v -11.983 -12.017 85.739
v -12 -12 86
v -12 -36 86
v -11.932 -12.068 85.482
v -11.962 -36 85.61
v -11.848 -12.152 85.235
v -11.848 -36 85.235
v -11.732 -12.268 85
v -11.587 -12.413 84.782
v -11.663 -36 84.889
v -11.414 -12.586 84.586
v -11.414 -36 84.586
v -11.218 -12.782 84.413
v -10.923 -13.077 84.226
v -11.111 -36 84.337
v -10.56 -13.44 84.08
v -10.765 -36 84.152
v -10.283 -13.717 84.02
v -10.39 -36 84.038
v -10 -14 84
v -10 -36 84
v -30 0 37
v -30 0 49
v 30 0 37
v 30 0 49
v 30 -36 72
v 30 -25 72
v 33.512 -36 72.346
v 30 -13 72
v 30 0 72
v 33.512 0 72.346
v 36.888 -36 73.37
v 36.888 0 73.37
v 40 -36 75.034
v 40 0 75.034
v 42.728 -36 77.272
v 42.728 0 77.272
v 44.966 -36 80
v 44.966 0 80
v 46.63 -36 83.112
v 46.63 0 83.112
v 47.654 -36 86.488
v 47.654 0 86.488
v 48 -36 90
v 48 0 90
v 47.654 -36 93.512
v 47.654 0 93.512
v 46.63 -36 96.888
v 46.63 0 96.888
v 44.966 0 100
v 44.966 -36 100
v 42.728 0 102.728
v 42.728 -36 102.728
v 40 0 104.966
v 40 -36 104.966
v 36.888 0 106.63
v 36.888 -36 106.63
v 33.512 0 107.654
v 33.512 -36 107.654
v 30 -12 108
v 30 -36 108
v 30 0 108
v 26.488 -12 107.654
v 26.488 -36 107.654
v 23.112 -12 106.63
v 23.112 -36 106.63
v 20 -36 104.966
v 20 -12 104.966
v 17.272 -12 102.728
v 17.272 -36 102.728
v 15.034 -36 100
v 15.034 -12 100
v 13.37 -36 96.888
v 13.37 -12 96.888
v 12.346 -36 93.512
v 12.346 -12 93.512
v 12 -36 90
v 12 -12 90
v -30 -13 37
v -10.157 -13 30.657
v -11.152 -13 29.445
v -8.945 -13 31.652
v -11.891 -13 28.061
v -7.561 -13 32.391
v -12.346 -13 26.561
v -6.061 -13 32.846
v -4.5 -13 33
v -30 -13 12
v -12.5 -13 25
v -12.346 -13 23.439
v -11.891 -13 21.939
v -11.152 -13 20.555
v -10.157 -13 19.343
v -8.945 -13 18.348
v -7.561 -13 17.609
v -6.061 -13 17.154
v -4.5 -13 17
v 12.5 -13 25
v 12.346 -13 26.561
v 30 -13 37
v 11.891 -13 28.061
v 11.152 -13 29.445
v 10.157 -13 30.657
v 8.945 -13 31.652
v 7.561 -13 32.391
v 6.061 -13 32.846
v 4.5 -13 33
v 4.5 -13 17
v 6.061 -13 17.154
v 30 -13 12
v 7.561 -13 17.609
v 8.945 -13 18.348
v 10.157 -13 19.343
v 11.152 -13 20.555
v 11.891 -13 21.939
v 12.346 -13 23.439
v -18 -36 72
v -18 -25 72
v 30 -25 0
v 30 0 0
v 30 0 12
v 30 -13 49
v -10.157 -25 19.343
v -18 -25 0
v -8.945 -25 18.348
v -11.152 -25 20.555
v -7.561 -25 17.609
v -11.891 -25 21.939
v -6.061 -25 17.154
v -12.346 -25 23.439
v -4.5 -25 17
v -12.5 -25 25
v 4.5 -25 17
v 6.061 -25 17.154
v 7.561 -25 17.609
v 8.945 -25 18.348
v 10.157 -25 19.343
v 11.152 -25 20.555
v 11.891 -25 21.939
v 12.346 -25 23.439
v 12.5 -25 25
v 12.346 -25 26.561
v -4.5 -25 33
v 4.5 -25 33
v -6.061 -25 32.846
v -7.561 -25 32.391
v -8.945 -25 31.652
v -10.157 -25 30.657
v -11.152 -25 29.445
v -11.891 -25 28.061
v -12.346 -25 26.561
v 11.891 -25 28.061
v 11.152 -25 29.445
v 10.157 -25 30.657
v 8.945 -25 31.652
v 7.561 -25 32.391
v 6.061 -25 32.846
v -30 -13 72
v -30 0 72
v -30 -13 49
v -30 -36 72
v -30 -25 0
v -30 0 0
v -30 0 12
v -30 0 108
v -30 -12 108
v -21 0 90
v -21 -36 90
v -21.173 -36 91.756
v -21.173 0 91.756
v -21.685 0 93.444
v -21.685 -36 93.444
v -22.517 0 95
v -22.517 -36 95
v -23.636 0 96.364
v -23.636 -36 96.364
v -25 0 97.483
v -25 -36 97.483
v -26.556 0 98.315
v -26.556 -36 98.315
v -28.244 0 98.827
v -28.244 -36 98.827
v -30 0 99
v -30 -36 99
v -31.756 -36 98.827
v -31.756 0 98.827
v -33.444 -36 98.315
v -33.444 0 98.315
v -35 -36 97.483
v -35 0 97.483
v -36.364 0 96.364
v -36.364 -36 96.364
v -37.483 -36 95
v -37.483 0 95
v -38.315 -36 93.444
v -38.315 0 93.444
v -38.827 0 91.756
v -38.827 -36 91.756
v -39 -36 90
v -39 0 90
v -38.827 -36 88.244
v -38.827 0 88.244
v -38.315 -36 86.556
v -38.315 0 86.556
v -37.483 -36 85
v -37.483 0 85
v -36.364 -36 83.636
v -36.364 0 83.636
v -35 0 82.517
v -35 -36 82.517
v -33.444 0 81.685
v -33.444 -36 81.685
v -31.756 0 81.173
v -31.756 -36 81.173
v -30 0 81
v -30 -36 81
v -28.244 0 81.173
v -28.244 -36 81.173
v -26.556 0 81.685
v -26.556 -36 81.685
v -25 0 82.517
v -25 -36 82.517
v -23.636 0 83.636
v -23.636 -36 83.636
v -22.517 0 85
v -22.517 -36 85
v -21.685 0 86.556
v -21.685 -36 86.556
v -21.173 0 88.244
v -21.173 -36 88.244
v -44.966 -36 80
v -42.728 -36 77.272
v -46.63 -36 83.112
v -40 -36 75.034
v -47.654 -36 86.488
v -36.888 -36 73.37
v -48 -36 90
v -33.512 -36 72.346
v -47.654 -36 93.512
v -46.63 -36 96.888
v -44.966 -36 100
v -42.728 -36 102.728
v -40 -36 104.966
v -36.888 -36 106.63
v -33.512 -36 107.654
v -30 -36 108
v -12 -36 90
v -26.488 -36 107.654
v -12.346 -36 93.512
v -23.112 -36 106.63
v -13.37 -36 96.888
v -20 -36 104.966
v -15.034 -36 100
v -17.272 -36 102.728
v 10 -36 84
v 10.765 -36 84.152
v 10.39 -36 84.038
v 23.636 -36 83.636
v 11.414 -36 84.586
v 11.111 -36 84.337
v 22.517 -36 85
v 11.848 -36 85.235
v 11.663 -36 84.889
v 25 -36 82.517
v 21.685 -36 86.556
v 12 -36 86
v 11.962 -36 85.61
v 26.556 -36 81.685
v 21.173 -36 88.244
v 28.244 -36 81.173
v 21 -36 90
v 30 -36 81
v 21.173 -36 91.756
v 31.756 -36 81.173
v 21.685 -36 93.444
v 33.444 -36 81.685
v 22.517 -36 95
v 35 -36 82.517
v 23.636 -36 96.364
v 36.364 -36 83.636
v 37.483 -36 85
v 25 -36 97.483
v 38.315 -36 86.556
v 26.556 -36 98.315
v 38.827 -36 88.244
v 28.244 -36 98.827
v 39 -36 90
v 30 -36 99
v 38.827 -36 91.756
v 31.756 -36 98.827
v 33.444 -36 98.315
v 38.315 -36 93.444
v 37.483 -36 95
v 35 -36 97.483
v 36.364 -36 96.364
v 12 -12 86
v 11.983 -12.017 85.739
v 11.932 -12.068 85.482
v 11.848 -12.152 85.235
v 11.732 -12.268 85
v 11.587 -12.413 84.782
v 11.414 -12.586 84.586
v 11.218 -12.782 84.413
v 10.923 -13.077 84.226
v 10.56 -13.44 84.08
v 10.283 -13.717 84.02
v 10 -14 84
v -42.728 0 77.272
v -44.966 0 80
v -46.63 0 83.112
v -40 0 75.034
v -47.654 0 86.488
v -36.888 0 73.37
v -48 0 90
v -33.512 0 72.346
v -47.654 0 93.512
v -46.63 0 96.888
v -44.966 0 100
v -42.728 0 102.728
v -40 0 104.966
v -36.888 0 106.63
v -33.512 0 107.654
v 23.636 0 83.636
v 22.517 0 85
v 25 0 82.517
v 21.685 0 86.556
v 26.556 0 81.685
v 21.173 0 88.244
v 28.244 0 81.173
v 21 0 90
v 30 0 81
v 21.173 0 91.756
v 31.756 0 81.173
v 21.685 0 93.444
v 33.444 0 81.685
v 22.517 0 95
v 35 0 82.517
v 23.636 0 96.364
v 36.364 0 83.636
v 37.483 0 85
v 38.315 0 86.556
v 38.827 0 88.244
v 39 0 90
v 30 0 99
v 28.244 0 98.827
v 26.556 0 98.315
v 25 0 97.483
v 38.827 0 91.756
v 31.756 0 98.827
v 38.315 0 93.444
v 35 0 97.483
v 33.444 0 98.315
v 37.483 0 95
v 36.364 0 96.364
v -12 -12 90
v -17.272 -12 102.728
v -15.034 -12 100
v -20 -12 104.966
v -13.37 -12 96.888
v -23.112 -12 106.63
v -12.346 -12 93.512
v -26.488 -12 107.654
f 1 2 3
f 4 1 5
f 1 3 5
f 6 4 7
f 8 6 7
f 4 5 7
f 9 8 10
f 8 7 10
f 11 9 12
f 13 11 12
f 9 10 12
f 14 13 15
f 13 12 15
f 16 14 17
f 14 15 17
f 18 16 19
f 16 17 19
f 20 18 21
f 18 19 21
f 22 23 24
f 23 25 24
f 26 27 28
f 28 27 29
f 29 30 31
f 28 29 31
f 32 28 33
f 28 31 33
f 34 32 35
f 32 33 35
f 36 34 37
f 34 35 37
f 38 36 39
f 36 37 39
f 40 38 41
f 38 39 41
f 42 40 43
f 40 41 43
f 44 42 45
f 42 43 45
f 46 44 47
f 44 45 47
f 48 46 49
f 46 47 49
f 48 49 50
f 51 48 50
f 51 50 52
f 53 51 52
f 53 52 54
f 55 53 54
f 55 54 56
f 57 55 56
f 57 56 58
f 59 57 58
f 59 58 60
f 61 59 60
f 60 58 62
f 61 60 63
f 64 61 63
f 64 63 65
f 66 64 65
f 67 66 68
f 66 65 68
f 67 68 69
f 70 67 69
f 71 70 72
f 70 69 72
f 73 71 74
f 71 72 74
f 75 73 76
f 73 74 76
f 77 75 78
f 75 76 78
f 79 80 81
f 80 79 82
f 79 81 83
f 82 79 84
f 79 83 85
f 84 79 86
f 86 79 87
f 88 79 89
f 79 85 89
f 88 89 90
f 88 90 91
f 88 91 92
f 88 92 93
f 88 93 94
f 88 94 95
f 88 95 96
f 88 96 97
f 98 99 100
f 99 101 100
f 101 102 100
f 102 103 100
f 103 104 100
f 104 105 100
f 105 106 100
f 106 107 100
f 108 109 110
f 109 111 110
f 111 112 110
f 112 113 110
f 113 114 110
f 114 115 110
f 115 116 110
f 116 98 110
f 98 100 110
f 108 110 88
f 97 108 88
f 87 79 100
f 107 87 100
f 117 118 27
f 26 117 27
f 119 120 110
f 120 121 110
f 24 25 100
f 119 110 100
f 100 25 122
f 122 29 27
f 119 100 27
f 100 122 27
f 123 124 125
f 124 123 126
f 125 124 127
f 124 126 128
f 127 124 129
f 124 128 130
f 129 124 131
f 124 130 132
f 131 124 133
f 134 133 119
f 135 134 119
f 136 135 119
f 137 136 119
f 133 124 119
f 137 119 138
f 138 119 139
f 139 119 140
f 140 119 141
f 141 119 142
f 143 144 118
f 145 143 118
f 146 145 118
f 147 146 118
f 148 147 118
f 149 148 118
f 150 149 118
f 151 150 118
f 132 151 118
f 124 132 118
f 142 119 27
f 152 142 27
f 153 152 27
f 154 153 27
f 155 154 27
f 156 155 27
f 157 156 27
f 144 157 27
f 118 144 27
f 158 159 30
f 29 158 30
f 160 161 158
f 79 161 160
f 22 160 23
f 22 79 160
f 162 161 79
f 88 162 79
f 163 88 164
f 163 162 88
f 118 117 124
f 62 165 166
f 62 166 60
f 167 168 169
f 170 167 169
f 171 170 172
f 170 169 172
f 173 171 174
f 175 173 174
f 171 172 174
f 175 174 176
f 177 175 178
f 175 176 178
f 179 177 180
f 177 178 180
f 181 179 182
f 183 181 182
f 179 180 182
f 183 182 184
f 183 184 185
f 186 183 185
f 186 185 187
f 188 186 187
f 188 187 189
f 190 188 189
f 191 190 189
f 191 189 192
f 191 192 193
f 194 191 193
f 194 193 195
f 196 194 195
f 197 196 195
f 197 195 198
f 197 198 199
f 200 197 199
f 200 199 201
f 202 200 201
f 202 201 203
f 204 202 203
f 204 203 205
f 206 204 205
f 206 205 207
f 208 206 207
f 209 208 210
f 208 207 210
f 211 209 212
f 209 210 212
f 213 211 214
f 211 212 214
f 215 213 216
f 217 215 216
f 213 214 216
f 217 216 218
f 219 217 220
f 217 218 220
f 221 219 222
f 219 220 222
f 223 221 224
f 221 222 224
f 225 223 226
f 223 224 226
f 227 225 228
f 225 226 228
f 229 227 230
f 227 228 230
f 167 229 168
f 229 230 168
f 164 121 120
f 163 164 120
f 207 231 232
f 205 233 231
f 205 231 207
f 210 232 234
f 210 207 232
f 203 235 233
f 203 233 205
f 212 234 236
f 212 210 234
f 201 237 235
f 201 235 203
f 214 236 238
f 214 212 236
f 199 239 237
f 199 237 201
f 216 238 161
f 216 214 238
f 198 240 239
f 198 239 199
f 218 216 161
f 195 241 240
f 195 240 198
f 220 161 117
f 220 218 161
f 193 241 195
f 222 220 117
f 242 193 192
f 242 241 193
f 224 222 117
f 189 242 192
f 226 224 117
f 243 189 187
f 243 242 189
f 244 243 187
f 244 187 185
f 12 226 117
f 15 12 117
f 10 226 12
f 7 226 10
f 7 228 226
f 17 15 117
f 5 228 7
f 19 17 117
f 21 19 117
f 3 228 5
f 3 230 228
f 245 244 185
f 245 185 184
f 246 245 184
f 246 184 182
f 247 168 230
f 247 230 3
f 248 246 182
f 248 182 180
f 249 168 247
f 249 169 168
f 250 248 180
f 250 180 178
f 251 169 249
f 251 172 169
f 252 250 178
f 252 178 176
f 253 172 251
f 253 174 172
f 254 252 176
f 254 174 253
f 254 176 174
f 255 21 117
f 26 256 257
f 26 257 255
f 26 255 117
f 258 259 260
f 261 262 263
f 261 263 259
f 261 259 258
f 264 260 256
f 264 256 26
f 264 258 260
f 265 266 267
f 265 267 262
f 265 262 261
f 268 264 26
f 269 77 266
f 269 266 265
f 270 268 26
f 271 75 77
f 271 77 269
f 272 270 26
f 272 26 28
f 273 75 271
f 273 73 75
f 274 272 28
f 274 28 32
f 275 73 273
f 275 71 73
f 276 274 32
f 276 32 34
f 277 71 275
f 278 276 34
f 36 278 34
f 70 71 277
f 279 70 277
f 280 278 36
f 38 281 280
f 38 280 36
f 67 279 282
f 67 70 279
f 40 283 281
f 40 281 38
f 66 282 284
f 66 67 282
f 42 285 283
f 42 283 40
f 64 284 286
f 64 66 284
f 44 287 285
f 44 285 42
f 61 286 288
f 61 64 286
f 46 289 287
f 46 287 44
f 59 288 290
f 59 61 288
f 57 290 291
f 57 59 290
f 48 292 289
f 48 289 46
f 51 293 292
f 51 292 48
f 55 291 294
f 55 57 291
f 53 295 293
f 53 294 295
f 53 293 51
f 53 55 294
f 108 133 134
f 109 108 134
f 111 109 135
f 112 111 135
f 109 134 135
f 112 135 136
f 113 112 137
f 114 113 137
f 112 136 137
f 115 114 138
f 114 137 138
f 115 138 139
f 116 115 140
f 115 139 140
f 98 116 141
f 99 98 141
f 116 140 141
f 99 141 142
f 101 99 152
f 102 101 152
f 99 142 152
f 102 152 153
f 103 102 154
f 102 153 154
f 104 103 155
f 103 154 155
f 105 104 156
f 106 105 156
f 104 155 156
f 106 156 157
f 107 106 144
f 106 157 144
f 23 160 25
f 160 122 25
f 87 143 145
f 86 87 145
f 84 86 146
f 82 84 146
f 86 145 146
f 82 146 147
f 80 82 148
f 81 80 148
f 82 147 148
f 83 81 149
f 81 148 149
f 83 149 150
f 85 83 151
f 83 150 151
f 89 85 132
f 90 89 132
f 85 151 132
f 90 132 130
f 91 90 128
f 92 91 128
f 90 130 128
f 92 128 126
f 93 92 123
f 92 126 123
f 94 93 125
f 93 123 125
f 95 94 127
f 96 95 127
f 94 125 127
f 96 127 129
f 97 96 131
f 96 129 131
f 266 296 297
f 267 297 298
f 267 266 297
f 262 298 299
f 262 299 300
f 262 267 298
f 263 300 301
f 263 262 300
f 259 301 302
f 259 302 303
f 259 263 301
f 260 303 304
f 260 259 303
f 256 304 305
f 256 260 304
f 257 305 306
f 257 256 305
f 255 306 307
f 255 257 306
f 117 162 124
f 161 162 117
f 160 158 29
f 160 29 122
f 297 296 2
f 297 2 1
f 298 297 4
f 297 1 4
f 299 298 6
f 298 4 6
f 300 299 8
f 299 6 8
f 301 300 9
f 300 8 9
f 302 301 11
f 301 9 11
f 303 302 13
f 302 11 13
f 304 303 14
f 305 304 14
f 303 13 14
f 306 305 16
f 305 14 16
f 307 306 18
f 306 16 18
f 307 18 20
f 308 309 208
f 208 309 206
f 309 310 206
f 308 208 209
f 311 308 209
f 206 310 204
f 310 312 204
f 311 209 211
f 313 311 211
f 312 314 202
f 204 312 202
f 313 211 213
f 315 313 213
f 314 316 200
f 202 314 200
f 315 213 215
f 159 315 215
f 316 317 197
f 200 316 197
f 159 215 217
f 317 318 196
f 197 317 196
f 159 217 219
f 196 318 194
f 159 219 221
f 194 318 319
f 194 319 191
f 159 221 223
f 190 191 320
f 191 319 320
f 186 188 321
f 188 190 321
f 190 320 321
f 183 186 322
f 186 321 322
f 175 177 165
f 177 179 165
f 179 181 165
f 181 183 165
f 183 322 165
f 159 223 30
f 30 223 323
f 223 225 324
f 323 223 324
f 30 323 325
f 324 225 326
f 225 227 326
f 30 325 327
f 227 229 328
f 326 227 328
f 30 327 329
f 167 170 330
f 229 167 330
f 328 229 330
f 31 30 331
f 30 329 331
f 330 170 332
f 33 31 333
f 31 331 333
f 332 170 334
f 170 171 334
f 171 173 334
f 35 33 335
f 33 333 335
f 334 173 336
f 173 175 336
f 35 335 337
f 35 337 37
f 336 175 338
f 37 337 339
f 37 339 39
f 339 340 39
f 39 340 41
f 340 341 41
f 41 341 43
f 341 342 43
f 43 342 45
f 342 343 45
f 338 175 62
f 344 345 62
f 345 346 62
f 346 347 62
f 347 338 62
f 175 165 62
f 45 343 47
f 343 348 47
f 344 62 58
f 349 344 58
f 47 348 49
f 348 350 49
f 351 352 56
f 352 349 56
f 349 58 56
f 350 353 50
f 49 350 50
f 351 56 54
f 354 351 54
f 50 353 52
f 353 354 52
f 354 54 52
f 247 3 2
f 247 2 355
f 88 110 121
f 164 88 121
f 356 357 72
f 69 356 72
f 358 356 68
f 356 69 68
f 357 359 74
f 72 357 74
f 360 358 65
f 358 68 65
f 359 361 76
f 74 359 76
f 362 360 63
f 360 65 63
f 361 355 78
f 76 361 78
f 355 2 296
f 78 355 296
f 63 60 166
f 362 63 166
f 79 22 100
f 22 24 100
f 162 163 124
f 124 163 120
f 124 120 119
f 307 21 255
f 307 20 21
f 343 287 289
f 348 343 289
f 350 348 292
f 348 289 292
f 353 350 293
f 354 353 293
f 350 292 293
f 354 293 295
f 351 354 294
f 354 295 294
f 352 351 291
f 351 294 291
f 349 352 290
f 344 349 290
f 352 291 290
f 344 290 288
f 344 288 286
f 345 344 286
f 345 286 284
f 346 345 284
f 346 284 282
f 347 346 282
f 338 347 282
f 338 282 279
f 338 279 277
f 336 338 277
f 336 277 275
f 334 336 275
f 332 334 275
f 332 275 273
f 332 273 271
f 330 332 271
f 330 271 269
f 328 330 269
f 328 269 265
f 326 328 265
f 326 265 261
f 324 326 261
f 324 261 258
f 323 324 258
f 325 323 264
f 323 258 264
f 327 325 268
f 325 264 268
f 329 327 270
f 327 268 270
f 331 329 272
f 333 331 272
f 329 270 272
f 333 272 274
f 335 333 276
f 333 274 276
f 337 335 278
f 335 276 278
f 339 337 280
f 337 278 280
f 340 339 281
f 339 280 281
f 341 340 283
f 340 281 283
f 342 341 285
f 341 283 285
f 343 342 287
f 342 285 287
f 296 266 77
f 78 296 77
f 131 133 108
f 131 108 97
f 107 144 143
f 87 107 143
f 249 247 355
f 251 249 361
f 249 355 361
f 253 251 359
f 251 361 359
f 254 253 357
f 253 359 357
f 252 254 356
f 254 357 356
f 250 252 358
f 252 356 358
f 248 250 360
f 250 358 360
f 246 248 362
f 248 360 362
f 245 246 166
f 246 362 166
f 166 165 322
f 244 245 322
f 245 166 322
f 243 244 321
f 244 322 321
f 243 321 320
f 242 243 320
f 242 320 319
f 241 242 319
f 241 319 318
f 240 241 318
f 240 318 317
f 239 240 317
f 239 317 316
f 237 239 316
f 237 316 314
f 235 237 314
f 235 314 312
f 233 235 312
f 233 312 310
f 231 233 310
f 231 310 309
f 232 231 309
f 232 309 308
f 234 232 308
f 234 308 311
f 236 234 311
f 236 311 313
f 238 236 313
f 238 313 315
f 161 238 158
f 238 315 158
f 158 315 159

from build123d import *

# Parameters (mm, degrees)
PAD_DEPTH       = 30
POCKET_DEPTH    = 25.001
PAD003_DEPTH    = 12
PAD001_DEPTH    = 36
PAD002_DEPTH    = 12
SKETCH004_R     = 9
POCKET001_DEPTH = 36.001
FILLET_R        = 2


with BuildPart() as pad003:
    # Sketch → Pad (new body, symmetric)
    with BuildSketch(Plane.YZ):
        Polygon((0, 0), (-25, 0), (-25, 72), (-13, 72), (-13, 49), (0, 49), (0, 37), (-13, 37), (-13, 12), (0, 12), align=None)
    extrude(amount=PAD_DEPTH, both=True)

    # Sketch001 → Pocket (cut, through all)
    with BuildSketch(Plane(origin=(0, -25, 0), x_dir=(0, 0, -1), z_dir=(0, -1, 0))):
        with BuildLine():
            ThreePointArc((-17, 4.5), (-25, 12.5), (-33, 4.5))
            Line((-33, 4.5), (-33, -4.5))
            ThreePointArc((-33, -4.5), (-25, -12.5), (-17, -4.5))
            Line((-17, 4.5), (-17, -4.5))
        make_face()
    extrude(amount=-POCKET_DEPTH, mode=Mode.SUBTRACT)

    # Sketch005 → Pad003 (new body)
    with BuildSketch(Plane(origin=(-30, 0, 0), x_dir=(0, 1, 0), z_dir=(-1, 0, 0))):
        Polygon((-25, 0), (-36, -72), (-25, -72), align=None)
    extrude(amount=-PAD003_DEPTH)


with BuildPart() as fusion:
    # Sketch002 → Pad001 (new body)
    with BuildSketch(Plane.XZ):
        with BuildLine():
            Line((-30, 72), (30, 72))
            ThreePointArc((30, 72), (42.727922, 102.727922), (12, 90))
            Line((12, 84), (12, 90))
            Line((-12, 84), (12, 84))
            Line((-12, 84), (-12, 90))
            ThreePointArc((-12, 90), (-42.727922, 102.727922), (-30, 72))
        make_face()
    extrude(amount=PAD001_DEPTH)

    # Sketch003 → Pad002 (new body)
    with BuildSketch(Plane(origin=(0, 0, 0), x_dir=(1, 0, 0), z_dir=(0, 1, 0))):
        with BuildLine():
            ThreePointArc((-30, -72), (-48, -90), (-30, -108))
            Line((-30, -108), (30, -108))
            ThreePointArc((30, -108), (48, -90), (30, -72))
            Line((-30, -72), (30, -72))
        make_face()
    extrude(amount=-PAD002_DEPTH)

    # Sketch004 → Pocket001 (cut, through all)
    with BuildSketch(Plane.XZ.offset(36)):
        with Locations((30, 90)):
            Circle(SKETCH004_R)
        with Locations((-30, 90)):
            Circle(SKETCH004_R)
    extrude(amount=-POCKET001_DEPTH, mode=Mode.SUBTRACT)

    # Fillet
    fillet_edges = [fusion.edges().sort_by_distance(p)[0] for p in [
        (12, -24, 84),
        (0, -12, 84),
        (-12, -24, 84),
    ]]
    fillet(fillet_edges, radius=FILLET_R)

    # Fusion: union Pad003
    add(pad003.part)


solid = fusion.part
